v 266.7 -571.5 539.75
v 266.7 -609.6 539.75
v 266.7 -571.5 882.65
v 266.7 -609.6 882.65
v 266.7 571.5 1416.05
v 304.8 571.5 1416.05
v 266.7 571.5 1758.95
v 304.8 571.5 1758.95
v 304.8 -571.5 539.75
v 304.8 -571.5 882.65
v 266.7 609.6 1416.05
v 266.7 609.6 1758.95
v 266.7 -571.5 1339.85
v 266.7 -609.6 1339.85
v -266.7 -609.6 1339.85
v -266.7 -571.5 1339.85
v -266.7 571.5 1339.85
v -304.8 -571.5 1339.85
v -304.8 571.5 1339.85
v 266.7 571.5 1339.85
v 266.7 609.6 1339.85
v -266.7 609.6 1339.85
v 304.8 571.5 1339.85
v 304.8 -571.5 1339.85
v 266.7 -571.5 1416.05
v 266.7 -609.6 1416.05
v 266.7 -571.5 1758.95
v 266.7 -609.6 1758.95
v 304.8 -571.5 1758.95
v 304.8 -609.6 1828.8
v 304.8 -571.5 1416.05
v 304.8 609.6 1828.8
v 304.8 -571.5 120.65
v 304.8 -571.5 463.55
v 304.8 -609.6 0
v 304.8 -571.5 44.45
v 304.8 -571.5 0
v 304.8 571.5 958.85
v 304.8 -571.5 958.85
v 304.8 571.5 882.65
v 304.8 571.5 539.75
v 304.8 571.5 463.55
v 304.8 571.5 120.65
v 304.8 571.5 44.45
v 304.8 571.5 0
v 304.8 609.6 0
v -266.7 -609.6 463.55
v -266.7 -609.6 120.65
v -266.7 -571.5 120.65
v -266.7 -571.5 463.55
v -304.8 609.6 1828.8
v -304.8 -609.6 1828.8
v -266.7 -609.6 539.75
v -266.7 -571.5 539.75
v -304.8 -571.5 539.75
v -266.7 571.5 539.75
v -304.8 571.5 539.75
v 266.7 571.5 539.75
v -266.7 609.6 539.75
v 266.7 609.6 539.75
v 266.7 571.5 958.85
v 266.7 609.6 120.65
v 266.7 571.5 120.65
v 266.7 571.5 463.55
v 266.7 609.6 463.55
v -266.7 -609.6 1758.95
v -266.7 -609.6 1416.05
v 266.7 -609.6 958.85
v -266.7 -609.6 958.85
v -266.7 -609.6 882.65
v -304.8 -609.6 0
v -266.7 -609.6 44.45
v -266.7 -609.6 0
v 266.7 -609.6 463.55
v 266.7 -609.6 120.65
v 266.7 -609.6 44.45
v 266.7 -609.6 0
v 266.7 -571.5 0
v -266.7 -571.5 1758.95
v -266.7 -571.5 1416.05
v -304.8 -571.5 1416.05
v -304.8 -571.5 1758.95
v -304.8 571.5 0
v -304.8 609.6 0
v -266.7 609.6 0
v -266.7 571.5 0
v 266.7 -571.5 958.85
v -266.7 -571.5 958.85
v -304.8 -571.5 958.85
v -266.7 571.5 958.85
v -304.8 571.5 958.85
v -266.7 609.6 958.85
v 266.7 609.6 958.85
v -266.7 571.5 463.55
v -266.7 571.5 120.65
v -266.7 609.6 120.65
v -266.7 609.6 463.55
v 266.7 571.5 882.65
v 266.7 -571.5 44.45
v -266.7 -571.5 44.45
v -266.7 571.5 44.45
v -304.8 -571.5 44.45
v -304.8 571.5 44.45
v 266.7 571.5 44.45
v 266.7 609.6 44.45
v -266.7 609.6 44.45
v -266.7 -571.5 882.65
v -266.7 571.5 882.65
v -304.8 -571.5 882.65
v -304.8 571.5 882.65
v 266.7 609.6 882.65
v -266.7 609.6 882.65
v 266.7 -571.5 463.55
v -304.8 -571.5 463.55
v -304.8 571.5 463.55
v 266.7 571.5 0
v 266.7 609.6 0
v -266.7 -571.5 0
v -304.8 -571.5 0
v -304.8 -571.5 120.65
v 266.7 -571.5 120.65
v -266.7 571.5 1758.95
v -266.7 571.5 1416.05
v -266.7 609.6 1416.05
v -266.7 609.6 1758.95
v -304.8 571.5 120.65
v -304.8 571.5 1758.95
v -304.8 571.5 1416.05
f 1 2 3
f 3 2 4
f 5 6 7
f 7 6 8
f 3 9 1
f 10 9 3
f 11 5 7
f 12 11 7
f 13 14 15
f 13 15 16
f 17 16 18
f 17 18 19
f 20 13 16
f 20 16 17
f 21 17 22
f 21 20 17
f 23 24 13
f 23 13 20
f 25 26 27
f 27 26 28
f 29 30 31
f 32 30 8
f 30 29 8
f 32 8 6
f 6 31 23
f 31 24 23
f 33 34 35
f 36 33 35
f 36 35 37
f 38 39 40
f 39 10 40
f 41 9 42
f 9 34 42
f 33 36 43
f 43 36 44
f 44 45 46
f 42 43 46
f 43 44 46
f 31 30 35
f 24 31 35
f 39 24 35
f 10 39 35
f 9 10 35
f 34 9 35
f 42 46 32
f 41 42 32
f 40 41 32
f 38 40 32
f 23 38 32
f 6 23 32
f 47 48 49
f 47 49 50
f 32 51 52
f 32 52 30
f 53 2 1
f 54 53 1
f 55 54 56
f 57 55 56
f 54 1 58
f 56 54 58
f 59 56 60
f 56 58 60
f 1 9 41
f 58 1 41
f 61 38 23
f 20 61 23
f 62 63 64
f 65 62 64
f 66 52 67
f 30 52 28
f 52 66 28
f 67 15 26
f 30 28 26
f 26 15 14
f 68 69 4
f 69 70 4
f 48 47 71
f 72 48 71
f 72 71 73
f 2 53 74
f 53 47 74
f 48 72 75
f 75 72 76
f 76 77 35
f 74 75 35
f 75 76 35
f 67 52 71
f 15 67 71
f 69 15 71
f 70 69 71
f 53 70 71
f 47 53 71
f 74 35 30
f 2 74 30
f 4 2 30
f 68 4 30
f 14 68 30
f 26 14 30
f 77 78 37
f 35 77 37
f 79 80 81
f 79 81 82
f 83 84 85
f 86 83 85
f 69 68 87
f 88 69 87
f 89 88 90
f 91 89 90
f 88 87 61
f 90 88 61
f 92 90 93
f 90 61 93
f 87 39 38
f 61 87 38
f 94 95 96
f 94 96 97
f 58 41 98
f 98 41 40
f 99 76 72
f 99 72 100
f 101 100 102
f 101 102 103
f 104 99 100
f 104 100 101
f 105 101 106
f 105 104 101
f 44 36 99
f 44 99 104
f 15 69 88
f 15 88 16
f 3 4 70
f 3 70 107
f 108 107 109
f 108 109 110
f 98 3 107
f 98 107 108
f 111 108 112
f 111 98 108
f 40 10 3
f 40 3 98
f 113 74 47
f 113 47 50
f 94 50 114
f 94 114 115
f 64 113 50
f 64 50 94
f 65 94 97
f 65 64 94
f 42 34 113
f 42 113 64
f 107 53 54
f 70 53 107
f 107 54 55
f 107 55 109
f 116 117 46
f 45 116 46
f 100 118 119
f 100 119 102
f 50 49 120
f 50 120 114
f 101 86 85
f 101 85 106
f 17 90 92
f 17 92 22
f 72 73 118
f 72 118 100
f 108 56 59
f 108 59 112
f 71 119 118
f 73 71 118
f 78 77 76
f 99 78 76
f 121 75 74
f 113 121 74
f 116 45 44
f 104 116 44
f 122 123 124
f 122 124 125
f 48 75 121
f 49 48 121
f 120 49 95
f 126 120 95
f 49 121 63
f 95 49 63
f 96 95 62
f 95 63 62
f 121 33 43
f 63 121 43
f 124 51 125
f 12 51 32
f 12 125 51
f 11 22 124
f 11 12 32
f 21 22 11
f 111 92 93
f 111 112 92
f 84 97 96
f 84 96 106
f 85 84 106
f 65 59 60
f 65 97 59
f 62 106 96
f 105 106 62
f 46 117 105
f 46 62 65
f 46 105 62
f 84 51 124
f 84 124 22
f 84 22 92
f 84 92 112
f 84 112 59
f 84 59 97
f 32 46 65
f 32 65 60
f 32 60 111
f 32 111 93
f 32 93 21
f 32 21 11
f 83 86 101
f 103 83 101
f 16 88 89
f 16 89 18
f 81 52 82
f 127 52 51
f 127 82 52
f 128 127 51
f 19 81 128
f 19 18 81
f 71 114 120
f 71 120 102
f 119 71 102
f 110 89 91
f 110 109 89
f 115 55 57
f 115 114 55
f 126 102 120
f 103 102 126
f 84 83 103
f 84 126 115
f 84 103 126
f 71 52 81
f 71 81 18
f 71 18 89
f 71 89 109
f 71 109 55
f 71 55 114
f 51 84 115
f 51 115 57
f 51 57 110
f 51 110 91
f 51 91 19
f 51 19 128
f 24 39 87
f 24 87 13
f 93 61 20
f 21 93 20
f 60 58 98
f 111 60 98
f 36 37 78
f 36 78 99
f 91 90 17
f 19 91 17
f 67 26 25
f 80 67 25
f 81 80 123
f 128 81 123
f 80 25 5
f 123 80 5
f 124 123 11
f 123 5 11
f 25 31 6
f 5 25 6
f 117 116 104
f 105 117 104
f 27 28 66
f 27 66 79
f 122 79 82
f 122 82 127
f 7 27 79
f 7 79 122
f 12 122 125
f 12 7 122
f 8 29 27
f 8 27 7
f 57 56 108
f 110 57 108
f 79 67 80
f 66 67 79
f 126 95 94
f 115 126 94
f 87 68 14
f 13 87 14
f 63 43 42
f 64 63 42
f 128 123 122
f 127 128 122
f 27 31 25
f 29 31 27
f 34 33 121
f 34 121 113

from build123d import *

# Parameters (mm, degrees)
F0_W     = 609.6
F0_H     = 1219.2
F1_DEPTH = 1828.8
F2_W     = 1143
F2_H     = 44.45
F2_H_2   = 342.9
F2_H_3   = 381
F3_DEPTH = 2656.84
F4_W     = 533.4
F4_H     = 44.45
F4_H_2   = 342.9
F4_H_3   = 381
F5_DEPTH = 1470.66


with BuildPart() as f1:
    # F0 (on Top) → F1 (new body)
    with BuildSketch(Plane.XY):
        Rectangle(F0_W, F0_H)
    extrude(amount=F1_DEPTH)

    # F2 (on face) → F3 (cut)
    with BuildSketch(Plane.YZ.offset(304.8)):
        with Locations((0, 22.225)):
            Rectangle(F2_W, F2_H)
        with Locations((0, 292.1)):
            Rectangle(F2_W, F2_H_2)
        with Locations((0, 711.2)):
            Rectangle(F2_W, F2_H_2)
        with Locations((0, 1149.35)):
            Rectangle(F2_W, F2_H_3)
        with Locations((0, 1587.5)):
            Rectangle(F2_W, F2_H_2)
    extrude(amount=-F3_DEPTH, mode=Mode.SUBTRACT)

    # F4 (on face) → F5 (cut)
    with BuildSketch(Plane.XZ.offset(609.6)):
        with Locations((0, 22.225)):
            Rectangle(F4_W, F4_H)
        with Locations((0, 711.2)):
            Rectangle(F4_W, F4_H_2)
        with Locations((0, 292.1)):
            Rectangle(F4_W, F4_H_2)
        with Locations((0, 1149.35)):
            Rectangle(F4_W, F4_H_3)
        with Locations((0, 1587.5)):
            Rectangle(F4_W, F4_H_2)
    extrude(amount=-F5_DEPTH, mode=Mode.SUBTRACT)


solid = f1.part
